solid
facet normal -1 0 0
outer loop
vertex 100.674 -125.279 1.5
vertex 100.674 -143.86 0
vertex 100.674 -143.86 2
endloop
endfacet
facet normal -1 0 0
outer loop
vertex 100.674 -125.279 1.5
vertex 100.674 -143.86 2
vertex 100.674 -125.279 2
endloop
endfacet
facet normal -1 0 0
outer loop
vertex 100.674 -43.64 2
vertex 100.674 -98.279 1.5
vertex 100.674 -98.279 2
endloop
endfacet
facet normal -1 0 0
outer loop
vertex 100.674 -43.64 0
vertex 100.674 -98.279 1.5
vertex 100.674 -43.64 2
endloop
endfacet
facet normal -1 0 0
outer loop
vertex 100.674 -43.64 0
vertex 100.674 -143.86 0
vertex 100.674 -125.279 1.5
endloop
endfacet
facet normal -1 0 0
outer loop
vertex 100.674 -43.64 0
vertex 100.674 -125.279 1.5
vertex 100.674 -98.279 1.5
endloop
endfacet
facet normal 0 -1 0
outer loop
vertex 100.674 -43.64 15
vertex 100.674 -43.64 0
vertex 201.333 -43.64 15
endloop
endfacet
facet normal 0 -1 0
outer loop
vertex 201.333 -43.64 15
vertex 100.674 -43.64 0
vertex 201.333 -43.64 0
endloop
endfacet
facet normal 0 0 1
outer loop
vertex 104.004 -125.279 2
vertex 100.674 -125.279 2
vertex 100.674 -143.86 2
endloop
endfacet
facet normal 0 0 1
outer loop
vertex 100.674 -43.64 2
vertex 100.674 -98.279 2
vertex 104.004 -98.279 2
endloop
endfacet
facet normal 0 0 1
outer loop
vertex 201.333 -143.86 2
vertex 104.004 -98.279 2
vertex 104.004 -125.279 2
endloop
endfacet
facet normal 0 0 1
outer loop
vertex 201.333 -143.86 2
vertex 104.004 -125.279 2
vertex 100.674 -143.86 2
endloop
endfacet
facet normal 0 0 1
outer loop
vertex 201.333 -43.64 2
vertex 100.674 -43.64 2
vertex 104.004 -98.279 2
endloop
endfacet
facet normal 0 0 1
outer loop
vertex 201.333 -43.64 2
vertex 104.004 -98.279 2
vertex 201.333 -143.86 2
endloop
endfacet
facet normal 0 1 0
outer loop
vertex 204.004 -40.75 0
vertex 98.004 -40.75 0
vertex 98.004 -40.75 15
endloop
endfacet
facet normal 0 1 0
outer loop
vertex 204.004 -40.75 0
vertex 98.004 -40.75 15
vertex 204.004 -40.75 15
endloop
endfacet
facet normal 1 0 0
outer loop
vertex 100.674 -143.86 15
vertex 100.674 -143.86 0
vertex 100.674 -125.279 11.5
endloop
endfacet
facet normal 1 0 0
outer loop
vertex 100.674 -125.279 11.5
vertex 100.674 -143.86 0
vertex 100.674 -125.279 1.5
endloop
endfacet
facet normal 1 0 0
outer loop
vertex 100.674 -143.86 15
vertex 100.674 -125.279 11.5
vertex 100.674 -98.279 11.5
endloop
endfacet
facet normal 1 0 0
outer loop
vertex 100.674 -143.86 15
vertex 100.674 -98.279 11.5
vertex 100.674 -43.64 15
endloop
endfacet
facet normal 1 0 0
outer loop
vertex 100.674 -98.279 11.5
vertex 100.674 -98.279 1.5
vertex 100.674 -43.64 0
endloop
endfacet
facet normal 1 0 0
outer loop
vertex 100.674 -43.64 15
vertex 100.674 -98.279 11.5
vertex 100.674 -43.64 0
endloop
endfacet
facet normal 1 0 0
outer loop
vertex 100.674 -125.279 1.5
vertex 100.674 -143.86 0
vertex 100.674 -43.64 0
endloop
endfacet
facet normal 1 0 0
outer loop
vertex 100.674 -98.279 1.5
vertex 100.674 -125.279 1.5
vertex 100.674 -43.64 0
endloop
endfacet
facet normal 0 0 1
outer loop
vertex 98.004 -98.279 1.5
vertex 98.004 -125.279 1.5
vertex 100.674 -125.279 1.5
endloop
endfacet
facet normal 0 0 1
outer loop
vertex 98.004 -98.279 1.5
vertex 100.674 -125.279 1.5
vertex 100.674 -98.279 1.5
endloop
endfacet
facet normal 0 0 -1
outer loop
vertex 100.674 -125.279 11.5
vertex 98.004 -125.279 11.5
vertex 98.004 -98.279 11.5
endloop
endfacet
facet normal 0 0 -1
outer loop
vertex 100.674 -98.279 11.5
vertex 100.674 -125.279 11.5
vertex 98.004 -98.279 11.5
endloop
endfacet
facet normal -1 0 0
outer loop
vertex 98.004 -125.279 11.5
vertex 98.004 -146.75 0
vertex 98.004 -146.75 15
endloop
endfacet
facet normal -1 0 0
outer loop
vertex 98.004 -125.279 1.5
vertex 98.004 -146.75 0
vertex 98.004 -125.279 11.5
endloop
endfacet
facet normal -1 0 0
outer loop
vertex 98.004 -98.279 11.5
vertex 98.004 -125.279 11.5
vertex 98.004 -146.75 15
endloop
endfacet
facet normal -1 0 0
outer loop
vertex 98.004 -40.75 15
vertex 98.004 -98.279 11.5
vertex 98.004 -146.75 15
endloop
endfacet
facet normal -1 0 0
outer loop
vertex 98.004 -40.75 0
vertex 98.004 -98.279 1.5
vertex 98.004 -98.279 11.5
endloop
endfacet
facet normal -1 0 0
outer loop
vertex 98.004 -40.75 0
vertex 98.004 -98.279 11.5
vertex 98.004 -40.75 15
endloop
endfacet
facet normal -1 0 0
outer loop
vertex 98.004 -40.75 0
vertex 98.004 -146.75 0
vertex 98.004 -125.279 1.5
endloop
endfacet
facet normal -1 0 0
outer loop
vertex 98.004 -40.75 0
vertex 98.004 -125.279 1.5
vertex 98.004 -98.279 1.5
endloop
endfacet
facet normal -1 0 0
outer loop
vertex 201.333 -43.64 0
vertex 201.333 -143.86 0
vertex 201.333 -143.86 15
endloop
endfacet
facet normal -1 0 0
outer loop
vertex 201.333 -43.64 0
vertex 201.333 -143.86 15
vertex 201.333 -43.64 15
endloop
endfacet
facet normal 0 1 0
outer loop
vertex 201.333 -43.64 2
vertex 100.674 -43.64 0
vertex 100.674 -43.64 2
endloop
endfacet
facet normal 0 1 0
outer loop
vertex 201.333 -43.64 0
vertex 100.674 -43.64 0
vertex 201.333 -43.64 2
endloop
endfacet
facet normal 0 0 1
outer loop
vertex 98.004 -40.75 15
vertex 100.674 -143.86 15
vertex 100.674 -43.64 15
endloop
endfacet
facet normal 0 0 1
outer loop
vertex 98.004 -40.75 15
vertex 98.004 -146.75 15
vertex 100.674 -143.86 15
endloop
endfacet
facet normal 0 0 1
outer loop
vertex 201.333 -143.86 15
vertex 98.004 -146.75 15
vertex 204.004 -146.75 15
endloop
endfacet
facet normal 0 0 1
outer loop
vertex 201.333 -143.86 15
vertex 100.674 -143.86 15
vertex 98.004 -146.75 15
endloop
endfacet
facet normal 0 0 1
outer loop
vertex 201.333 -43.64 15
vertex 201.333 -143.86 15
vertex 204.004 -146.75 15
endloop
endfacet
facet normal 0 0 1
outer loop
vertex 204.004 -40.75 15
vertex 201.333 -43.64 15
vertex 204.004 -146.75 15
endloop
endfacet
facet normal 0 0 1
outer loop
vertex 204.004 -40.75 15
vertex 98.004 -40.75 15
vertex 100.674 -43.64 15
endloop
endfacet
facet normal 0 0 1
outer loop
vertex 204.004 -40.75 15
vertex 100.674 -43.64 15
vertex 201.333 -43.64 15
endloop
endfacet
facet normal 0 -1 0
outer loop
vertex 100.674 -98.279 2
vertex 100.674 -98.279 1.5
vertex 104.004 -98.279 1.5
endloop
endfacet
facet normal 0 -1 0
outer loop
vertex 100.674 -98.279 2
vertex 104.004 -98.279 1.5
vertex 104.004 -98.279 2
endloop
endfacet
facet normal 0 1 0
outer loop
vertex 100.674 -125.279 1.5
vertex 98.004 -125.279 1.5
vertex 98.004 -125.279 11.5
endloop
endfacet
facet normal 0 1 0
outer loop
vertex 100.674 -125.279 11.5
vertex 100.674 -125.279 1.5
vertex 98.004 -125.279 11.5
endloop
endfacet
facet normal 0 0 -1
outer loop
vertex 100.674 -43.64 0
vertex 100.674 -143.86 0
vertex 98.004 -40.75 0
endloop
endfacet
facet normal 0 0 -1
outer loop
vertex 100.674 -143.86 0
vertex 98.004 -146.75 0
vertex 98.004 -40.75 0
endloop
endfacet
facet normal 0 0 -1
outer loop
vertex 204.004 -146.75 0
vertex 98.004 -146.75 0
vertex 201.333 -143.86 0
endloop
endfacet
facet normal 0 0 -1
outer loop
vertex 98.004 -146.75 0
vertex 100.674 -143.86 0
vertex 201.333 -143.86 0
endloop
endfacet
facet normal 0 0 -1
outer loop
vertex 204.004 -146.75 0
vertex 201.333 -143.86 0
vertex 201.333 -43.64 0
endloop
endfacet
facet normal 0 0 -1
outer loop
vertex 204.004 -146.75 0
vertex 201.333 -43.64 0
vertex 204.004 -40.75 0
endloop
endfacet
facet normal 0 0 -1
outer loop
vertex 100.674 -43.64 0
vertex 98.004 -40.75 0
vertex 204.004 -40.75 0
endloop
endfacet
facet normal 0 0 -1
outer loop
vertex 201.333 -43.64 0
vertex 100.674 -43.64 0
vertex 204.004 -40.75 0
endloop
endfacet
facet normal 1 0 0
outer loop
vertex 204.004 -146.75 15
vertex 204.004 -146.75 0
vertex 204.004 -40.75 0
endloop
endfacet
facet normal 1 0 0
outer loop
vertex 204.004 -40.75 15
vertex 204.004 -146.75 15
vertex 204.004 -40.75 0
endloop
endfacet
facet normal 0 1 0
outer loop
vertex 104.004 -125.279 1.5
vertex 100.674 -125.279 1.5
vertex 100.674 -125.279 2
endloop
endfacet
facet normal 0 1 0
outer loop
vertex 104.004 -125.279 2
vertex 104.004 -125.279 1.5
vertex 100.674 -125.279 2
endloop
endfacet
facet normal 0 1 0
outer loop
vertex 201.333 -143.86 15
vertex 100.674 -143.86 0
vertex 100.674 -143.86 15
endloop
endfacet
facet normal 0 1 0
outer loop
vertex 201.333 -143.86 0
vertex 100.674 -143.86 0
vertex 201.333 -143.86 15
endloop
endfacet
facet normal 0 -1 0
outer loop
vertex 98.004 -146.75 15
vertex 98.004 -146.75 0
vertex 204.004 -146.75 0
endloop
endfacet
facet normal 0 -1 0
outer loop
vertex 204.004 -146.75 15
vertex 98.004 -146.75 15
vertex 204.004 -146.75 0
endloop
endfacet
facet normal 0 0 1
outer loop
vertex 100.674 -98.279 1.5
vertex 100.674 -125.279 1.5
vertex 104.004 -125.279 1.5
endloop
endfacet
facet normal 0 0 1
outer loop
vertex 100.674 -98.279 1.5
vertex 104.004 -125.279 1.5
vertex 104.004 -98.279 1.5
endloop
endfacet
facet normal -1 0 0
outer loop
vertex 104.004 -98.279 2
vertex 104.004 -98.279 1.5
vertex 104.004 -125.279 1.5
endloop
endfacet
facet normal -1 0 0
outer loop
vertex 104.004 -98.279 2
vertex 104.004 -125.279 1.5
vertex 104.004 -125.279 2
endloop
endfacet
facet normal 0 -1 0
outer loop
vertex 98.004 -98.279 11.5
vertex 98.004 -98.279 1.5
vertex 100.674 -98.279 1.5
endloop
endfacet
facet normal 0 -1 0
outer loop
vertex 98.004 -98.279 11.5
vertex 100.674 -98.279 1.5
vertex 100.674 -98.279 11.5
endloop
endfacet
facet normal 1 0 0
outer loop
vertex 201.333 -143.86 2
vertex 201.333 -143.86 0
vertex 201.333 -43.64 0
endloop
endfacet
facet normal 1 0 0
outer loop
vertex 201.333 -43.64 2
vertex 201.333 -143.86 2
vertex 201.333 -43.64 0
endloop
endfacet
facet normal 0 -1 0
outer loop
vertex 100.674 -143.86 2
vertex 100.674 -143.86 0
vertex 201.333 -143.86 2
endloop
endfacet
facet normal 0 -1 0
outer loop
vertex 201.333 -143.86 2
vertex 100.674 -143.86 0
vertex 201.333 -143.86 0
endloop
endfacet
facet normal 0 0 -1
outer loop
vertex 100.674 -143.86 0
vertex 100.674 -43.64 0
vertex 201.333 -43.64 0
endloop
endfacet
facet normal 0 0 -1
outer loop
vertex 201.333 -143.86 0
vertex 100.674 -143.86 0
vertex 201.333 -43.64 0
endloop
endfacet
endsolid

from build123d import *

# Parameters (mm, degrees)
SKETCH2_W           = 106
SKETCH2_H           = 106
SKETCH2_W_2         = 100.659036826
SKETCH2_H_2         = 100.220116606
BOSS_EXTRUDE2_DEPTH = 15
SKETCH2_5_W         = 100.659036826
SKETCH2_5_H         = 100.220116606
BOSS_EXTRUDE5_DEPTH = 2
SKETCH6_W           = 10
SKETCH6_H           = 27
CUT_EXTRUDE1_DEPTH  = 6


with BuildPart() as part:
    # Sketch2 → Boss-Extrude2 (new body)
    with BuildSketch(Plane.XY):
        with Locations((151.0037, -93.75)):
            Rectangle(SKETCH2_W, SKETCH2_H)
        with Locations((151.0037, -93.75)):
            Rectangle(SKETCH2_W_2, SKETCH2_H_2, mode=Mode.SUBTRACT)
    extrude(amount=BOSS_EXTRUDE2_DEPTH)


with BuildPart() as body_2:
    # Sketch2<5> → Boss-Extrude5 (new body)
    with BuildSketch(Plane.XY):
        with Locations((151.0037, -93.75)):
            Rectangle(SKETCH2_5_W, SKETCH2_5_H)
    extrude(amount=BOSS_EXTRUDE5_DEPTH)


with BuildPart() as cut_extrude1_tool:
    # Sketch6 → Cut-Extrude1 (new body)
    with BuildSketch(Plane.ZY.offset(-98.0037)):
        with Locations((6.5, -111.779102378)):
            Rectangle(SKETCH6_W, SKETCH6_H)
    extrude(amount=-CUT_EXTRUDE1_DEPTH)


with BuildPart() as part_1:
    add(part.part)

    # Cut-Extrude1: cut by cut_extrude1_tool
    add(cut_extrude1_tool.part, mode=Mode.SUBTRACT)


with BuildPart() as body_2_1:
    add(body_2.part)

    # Cut-Extrude1: cut by cut_extrude1_tool
    add(cut_extrude1_tool.part, mode=Mode.SUBTRACT)


solid = Compound([part_1.part, body_2_1.part])
